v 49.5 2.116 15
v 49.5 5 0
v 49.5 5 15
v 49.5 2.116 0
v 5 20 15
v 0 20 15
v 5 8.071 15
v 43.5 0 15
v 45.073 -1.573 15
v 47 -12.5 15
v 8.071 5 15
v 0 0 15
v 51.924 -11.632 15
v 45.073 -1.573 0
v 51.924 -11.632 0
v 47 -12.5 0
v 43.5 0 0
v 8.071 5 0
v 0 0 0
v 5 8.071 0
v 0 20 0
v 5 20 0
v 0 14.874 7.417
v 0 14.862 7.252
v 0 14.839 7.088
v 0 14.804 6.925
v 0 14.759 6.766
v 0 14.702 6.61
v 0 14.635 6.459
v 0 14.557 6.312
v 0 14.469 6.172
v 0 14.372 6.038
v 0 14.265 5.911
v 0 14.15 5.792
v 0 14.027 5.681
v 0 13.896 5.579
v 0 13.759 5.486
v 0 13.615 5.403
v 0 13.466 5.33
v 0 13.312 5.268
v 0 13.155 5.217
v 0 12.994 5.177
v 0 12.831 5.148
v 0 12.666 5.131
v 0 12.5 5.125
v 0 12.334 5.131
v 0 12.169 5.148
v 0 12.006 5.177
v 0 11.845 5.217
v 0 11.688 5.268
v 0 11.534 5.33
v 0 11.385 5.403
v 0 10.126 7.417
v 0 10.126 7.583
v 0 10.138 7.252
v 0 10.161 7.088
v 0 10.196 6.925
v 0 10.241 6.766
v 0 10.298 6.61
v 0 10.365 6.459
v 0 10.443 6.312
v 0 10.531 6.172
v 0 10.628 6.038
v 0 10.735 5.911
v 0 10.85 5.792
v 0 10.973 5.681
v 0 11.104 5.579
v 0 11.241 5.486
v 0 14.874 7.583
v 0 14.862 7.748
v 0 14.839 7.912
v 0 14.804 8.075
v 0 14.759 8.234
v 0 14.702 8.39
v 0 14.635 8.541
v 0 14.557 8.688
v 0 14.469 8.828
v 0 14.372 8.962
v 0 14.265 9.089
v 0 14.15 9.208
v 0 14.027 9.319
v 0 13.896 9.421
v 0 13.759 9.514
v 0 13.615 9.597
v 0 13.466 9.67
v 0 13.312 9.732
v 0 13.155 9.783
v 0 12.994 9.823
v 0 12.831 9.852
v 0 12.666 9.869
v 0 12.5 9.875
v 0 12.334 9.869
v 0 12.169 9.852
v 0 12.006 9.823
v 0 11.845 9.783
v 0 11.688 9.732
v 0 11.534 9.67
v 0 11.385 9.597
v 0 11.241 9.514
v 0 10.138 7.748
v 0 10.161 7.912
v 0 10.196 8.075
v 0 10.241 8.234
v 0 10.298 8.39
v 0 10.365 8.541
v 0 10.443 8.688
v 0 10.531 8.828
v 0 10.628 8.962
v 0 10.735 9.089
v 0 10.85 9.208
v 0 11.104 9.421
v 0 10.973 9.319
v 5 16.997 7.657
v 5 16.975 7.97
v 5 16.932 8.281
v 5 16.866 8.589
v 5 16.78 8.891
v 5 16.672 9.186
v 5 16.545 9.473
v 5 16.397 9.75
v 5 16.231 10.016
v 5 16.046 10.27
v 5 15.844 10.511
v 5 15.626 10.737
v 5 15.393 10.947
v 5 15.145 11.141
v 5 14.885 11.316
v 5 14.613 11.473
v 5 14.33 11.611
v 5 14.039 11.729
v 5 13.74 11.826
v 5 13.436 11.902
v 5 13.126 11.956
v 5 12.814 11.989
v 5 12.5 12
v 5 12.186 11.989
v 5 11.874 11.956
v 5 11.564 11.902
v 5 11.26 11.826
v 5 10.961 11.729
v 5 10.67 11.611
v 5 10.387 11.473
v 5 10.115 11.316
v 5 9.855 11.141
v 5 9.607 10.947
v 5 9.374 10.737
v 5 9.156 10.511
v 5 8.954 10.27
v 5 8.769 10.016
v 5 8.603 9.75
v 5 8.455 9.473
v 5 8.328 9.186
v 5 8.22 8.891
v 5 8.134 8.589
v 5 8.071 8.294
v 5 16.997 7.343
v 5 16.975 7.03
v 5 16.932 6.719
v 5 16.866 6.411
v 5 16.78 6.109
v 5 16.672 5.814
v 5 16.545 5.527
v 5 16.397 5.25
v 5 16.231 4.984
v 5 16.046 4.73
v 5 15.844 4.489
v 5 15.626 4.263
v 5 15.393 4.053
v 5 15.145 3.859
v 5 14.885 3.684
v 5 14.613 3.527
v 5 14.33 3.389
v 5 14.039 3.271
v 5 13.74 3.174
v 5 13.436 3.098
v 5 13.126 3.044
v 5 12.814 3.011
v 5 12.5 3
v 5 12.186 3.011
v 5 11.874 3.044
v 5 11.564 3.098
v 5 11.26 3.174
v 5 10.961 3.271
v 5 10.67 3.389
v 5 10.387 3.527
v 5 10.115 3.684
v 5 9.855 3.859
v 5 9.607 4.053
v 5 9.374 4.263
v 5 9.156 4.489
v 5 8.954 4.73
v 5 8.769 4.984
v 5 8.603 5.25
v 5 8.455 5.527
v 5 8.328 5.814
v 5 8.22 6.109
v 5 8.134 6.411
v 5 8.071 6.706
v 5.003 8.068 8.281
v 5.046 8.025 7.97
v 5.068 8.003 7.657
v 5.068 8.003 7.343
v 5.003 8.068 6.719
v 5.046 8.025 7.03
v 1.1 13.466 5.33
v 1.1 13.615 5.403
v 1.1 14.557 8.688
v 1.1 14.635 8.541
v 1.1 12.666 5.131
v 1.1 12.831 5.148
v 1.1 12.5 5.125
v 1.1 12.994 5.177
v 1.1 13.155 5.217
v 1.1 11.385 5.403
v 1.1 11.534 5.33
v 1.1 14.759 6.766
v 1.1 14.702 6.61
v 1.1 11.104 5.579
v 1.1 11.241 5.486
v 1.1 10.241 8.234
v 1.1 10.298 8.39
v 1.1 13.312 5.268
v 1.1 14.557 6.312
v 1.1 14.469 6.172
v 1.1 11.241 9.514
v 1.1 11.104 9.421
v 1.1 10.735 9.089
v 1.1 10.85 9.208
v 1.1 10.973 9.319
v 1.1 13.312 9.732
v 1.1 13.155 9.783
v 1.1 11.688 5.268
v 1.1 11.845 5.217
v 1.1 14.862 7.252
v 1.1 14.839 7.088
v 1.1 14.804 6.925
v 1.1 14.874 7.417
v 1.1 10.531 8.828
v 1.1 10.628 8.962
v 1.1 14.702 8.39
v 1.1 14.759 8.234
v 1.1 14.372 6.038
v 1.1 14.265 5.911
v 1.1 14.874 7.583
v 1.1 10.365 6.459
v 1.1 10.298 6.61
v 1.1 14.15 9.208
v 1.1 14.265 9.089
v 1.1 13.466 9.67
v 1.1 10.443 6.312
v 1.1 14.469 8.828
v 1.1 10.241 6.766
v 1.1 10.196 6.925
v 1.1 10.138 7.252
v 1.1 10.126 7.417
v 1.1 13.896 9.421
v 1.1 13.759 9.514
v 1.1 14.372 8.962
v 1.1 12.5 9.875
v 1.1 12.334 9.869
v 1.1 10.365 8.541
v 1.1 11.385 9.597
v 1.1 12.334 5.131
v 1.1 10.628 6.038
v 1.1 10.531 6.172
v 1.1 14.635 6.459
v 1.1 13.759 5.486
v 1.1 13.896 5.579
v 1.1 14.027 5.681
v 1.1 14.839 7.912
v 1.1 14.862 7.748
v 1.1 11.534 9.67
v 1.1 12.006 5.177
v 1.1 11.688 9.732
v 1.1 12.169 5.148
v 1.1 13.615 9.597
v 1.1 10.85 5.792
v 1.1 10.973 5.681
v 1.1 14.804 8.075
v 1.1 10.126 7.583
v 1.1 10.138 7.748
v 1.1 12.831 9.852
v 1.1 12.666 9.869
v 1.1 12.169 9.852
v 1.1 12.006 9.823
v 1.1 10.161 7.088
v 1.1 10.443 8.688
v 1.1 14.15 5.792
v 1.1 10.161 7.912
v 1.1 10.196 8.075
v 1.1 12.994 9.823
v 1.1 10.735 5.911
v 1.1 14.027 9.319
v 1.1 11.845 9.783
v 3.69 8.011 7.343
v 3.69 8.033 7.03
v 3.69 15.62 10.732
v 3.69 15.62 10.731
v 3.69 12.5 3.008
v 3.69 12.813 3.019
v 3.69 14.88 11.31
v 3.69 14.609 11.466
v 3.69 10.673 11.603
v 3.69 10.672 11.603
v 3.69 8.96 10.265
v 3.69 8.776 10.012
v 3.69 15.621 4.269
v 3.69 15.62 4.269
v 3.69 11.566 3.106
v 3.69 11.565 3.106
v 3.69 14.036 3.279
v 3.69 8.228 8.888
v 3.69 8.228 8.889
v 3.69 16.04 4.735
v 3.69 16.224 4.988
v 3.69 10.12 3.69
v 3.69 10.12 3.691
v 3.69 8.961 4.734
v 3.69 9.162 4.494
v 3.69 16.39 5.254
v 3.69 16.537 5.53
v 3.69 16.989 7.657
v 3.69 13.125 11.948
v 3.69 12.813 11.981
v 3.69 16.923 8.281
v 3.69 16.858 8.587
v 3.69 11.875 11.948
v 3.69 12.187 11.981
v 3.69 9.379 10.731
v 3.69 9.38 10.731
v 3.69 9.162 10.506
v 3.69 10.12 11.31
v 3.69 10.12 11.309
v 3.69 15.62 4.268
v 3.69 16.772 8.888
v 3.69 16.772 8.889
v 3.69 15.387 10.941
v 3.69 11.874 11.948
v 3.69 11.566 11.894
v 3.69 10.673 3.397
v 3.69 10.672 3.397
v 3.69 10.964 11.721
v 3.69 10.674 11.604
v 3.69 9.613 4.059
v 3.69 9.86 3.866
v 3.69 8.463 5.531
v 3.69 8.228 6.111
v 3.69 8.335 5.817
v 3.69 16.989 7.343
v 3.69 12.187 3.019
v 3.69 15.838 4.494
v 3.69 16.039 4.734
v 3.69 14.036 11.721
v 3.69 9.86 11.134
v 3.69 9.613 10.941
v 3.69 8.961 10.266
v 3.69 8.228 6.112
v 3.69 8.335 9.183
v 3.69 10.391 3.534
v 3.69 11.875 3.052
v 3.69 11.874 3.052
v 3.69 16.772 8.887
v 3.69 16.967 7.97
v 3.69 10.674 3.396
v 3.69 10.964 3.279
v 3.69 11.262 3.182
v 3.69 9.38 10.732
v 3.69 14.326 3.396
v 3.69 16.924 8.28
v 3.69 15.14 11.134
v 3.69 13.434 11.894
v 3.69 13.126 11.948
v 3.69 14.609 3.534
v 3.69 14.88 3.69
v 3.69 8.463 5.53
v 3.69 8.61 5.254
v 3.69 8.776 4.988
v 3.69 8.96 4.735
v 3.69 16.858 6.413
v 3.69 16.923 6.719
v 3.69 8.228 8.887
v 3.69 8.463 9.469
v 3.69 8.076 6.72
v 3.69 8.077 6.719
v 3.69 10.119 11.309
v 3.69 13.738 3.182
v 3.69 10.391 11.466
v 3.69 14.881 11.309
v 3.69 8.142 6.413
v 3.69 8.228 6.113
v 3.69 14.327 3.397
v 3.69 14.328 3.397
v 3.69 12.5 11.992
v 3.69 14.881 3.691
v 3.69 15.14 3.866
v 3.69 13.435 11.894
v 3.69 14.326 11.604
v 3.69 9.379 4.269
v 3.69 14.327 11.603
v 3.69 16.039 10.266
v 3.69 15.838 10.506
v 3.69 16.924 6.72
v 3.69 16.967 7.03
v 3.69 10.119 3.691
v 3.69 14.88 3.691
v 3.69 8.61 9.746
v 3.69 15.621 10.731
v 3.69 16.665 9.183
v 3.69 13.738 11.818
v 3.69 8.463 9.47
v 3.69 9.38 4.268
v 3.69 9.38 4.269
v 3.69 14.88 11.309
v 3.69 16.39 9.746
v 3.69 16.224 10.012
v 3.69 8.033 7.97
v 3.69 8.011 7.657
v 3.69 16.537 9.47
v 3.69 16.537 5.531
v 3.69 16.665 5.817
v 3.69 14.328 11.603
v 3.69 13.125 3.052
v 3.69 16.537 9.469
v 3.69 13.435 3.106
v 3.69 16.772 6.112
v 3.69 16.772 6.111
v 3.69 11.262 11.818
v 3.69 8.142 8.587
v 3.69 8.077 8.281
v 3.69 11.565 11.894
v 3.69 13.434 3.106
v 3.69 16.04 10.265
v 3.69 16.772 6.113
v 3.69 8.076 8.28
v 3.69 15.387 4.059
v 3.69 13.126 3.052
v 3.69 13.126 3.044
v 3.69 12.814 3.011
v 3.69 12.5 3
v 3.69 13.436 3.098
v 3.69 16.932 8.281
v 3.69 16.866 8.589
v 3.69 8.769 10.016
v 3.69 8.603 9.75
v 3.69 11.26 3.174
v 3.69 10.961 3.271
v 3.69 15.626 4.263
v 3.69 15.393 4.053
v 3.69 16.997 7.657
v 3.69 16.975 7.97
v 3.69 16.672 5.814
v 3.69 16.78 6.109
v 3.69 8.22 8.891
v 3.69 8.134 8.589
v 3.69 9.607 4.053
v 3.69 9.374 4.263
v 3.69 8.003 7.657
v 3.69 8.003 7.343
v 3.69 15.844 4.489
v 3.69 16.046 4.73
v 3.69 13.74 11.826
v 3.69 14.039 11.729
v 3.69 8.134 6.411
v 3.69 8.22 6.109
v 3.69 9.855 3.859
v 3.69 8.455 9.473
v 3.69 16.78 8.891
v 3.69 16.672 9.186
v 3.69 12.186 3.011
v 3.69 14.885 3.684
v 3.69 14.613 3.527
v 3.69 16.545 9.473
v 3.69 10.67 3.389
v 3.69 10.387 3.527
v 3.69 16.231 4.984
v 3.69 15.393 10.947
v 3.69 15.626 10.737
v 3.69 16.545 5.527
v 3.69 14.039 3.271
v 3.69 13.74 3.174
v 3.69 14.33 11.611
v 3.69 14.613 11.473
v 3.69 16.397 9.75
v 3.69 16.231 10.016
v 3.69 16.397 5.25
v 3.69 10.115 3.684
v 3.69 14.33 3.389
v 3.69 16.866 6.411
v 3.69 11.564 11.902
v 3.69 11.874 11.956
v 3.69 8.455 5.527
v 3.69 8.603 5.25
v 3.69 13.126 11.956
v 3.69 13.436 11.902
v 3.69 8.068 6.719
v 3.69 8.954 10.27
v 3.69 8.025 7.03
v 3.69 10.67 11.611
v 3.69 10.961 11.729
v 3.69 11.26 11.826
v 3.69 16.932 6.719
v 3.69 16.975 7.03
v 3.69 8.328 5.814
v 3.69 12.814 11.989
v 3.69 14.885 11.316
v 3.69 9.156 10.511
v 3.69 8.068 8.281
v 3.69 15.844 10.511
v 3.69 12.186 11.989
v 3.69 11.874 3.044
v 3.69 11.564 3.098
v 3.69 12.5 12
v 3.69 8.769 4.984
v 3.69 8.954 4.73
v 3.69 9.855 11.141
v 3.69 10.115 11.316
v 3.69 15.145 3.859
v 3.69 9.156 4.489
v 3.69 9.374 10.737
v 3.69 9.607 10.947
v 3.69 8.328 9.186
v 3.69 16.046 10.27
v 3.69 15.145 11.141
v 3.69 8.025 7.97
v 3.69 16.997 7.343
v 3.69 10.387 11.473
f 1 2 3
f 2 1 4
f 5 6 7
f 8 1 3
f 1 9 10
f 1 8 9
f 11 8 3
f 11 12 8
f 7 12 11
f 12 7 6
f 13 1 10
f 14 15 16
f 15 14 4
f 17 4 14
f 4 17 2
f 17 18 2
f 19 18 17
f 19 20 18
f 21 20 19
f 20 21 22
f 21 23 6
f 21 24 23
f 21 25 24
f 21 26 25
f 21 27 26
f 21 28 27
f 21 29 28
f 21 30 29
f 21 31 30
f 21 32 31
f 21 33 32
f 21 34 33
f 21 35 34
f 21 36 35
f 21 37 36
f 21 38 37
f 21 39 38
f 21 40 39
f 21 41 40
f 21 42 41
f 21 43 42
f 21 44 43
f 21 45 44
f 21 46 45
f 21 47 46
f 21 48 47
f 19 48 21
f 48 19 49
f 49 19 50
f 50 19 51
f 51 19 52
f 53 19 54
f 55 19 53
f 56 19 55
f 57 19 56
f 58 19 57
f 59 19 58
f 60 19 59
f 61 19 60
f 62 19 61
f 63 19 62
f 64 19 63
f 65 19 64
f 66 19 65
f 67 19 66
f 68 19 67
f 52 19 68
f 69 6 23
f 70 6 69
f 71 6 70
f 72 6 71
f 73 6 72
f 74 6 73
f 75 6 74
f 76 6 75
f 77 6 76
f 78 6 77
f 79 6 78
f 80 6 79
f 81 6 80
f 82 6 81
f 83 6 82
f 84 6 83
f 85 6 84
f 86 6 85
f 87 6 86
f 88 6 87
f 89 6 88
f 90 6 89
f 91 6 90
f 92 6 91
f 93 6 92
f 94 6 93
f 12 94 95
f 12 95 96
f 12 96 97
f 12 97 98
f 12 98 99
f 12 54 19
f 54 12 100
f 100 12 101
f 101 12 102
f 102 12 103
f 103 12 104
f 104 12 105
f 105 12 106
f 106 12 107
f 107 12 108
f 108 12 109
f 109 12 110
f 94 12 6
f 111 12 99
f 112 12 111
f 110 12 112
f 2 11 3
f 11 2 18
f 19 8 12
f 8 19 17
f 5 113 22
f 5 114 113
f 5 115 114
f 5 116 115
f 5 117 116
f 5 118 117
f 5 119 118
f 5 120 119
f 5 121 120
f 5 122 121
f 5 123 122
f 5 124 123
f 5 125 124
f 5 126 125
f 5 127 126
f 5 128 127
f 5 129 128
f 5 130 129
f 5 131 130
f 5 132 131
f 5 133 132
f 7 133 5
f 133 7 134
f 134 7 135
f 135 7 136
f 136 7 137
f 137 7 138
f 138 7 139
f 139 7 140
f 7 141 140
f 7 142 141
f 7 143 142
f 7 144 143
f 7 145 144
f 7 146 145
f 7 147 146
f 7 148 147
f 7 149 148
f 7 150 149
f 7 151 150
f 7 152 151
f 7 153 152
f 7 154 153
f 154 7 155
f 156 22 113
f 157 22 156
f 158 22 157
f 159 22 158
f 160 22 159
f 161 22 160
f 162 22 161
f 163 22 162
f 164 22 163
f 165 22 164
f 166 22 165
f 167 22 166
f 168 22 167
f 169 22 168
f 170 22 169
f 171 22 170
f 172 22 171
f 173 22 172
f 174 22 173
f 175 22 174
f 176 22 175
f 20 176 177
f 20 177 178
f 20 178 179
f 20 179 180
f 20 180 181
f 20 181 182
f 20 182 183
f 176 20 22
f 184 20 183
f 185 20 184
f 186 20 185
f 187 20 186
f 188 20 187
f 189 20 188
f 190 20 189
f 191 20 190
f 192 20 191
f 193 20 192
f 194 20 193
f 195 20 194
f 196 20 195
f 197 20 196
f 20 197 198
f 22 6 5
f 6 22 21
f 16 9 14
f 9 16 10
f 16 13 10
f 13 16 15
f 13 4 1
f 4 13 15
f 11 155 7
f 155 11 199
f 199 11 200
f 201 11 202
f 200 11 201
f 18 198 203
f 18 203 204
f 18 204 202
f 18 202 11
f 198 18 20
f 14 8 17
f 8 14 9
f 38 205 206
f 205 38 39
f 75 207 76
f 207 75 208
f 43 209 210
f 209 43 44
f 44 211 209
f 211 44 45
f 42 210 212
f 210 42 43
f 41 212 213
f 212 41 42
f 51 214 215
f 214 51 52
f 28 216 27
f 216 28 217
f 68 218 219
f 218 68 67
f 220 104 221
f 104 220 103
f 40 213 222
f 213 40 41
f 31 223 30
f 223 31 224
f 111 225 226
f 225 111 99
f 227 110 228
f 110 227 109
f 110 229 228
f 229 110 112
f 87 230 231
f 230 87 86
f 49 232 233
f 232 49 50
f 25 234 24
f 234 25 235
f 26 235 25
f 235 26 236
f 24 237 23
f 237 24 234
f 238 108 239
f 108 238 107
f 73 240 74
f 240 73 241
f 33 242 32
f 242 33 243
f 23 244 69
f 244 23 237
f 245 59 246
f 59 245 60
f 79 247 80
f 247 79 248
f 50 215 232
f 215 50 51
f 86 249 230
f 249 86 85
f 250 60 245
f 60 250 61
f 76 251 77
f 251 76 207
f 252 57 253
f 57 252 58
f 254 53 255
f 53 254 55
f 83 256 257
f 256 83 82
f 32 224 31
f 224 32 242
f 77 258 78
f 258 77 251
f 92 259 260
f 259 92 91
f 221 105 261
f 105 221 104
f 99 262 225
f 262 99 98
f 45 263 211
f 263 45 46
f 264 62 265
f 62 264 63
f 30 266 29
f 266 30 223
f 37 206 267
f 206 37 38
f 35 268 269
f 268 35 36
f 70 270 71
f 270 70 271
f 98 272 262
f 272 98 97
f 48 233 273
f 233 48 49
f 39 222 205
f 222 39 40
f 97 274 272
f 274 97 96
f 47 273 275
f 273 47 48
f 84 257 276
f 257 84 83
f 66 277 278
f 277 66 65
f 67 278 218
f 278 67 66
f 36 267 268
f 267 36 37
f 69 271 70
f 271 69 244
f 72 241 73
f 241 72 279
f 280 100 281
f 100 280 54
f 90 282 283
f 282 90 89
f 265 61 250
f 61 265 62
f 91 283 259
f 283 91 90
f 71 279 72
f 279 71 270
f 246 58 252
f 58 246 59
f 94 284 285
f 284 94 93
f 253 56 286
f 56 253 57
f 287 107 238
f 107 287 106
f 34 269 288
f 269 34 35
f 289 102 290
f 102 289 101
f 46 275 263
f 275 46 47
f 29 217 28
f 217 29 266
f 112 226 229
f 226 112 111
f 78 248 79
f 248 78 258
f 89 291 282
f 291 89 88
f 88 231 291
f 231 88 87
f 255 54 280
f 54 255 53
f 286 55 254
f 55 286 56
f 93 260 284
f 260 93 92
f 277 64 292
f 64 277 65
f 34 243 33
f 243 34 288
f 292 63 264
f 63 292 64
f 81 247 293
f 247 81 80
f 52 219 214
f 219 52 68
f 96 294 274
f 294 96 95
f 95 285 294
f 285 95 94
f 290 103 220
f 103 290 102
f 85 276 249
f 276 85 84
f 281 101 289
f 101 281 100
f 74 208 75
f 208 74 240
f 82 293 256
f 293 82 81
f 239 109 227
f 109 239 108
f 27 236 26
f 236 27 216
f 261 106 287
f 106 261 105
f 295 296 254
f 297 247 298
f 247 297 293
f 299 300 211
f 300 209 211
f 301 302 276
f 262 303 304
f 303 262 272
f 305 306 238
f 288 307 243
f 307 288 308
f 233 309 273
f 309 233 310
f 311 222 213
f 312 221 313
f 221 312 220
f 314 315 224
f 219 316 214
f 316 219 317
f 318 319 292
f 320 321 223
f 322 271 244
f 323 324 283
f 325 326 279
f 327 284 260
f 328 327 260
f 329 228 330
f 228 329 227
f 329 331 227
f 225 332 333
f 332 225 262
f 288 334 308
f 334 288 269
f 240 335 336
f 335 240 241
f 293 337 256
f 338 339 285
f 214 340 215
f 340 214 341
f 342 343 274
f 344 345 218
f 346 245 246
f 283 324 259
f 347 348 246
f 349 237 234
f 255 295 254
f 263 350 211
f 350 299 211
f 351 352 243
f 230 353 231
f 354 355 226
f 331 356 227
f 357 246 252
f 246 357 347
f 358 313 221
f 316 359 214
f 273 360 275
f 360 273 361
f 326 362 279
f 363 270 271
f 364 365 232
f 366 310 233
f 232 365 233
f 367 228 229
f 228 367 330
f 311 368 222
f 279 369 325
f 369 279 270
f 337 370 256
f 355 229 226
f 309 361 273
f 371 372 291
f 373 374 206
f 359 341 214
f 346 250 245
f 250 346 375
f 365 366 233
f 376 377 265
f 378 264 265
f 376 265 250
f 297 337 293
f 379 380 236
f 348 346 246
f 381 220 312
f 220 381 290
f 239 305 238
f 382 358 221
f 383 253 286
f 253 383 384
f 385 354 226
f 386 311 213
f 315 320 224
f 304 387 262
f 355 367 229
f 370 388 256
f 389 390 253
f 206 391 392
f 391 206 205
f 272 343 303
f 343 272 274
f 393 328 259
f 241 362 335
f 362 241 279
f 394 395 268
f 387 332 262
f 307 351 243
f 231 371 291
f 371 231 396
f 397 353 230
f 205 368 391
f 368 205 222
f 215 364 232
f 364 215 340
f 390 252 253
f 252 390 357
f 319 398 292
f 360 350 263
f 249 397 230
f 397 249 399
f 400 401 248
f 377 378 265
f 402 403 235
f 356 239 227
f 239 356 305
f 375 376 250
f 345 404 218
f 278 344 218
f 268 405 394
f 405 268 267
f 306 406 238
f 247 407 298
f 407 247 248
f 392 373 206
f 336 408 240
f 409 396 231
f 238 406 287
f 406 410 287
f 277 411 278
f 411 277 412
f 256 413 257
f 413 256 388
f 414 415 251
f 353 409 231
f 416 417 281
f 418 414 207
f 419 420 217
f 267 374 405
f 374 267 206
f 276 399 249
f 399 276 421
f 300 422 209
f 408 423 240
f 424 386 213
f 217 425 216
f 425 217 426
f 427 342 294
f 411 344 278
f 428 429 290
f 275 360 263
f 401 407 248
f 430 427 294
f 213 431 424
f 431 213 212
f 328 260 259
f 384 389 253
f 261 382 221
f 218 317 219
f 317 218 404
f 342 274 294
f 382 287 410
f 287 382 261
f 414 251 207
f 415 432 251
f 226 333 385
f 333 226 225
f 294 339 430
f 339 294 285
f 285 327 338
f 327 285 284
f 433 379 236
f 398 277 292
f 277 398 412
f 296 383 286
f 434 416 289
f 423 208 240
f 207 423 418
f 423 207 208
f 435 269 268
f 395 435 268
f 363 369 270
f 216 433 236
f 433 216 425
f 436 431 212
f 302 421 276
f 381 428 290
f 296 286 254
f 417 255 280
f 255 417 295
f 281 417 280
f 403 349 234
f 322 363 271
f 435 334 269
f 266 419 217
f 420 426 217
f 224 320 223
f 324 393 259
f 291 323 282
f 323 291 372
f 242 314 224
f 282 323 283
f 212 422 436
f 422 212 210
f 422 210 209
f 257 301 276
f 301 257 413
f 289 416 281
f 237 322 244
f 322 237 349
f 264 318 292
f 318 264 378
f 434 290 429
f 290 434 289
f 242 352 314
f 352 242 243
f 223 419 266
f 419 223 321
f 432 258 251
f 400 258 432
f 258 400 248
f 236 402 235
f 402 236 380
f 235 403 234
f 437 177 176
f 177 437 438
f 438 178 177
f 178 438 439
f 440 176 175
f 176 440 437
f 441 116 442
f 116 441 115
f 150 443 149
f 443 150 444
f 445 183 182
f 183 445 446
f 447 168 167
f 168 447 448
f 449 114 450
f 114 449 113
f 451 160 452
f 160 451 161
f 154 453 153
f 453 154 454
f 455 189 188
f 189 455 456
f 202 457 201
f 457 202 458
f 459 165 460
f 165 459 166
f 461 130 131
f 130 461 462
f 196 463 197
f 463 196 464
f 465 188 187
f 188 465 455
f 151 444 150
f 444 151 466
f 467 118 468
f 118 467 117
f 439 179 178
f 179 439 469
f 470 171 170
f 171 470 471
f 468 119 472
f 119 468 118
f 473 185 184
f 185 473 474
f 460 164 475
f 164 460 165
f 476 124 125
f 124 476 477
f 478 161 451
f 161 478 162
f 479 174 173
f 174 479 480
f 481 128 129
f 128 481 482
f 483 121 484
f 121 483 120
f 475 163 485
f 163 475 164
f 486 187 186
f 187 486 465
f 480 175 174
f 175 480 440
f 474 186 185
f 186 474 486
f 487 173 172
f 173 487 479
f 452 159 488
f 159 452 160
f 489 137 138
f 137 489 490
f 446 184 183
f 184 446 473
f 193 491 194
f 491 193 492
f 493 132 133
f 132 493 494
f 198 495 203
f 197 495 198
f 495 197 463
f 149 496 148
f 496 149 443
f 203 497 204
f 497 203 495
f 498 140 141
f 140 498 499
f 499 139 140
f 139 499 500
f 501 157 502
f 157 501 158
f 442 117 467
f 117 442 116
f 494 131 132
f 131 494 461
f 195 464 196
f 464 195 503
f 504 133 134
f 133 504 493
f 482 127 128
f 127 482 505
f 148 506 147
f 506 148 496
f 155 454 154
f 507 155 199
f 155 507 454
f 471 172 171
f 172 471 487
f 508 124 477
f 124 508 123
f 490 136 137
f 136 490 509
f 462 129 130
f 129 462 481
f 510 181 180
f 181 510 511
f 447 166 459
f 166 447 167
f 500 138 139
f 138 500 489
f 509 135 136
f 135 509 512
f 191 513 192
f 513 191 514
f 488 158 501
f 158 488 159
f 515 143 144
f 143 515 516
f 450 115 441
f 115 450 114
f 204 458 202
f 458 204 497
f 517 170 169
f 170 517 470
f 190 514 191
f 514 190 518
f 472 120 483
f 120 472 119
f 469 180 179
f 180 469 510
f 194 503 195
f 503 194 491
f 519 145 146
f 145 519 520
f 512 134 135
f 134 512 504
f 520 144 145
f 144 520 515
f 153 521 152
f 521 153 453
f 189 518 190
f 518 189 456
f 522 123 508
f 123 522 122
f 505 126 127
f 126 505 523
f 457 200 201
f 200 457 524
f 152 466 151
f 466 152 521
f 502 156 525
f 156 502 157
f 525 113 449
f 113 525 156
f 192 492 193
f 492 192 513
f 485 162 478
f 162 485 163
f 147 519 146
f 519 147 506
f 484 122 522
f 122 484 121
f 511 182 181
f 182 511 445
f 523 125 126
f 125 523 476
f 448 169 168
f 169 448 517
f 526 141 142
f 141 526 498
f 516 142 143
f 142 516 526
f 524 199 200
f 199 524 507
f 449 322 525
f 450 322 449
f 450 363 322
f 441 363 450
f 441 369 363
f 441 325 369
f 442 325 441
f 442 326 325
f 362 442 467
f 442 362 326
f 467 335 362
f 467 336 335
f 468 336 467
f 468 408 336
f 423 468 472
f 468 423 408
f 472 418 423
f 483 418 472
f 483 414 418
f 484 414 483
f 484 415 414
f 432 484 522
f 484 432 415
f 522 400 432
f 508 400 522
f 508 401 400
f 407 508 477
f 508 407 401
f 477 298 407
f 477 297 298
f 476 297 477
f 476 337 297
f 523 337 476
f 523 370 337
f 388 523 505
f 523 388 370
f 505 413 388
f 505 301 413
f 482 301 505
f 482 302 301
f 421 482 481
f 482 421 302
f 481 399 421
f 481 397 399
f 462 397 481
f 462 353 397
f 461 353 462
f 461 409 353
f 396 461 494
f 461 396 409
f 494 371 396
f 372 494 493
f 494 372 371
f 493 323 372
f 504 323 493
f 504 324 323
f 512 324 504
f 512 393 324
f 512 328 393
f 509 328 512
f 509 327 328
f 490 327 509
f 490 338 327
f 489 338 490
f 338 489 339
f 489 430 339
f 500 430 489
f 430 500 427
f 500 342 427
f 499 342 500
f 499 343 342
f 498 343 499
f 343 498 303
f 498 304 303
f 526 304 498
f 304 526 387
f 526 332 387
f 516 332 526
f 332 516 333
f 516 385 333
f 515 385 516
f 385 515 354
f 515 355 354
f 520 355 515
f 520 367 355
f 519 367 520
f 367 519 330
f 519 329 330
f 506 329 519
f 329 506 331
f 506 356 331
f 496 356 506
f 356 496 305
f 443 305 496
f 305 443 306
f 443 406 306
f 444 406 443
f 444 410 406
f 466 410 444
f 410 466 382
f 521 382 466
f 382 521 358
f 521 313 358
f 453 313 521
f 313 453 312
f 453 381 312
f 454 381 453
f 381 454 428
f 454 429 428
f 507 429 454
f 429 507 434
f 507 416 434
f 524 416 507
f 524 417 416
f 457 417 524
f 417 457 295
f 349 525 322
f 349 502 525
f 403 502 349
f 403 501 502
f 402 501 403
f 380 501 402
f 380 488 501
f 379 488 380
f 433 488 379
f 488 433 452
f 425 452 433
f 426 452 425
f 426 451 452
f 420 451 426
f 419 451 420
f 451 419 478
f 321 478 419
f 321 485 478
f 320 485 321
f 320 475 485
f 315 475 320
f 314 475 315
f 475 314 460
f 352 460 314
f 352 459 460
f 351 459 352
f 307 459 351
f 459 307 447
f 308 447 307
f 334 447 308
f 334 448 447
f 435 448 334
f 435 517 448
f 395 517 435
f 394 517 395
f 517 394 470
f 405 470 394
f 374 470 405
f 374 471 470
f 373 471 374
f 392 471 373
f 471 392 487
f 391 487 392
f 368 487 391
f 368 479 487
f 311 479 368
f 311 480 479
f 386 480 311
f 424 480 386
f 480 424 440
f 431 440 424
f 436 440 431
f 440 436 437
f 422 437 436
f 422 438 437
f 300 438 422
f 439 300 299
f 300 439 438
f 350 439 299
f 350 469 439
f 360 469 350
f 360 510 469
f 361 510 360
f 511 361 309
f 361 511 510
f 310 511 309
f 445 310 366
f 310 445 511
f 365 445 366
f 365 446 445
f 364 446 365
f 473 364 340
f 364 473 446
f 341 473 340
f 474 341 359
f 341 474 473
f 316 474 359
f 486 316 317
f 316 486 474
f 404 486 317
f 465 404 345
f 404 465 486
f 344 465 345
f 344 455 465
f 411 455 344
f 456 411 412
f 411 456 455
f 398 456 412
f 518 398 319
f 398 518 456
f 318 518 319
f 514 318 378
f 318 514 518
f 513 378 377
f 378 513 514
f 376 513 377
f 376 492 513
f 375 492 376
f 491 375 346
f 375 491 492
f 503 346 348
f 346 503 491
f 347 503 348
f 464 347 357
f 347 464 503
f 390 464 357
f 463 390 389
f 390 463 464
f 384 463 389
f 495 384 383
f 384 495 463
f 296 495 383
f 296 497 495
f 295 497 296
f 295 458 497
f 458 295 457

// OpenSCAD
$fa=4; // default minimum facet angle is now 0.5
$fs=0.05; // default minimum facet size is now 0.05 mm

screwHoleDiam = 4.75;
countersinkDiam = 9;
wallThickness = 5;

difference() {
  union () {
    cube([49.5, wallThickness, 15]);
    cube([wallThickness, 20, 15]);
    translate([47, -12.5, 0]) rotate([0, 0, 10]) cube([wallThickness, 15, 15]);
    translate([5, 1, 0]) rotate([0, 0, 45]) cube([5, 5, 15]);
    translate([45.25, -1.75, 0]) rotate([0, 0, 45]) cube([2.5, 2.5, 15]);
  }
  translate([-2.5, 12.5, 7.5]) rotate([0, 90, 0]) chamferedScrewHole(countersinkDiam / 2, screwHoleDiam / 2, 5 + 1, wallThickness / 2);
}

module chamferedScrewHole(rh, rs, d, ds, t = .1) {
  translate([0, 0, -t]) cylinder(r=rs, h=d + t);
  translate([0, 0, d - ds + t]) cylinder(r1=rs, r2=rh, h=ds + t);
  translate([0, 0, d - ds + 2*t + ds - .01]) cylinder(r=rh, h=ds + t + 5);
}
